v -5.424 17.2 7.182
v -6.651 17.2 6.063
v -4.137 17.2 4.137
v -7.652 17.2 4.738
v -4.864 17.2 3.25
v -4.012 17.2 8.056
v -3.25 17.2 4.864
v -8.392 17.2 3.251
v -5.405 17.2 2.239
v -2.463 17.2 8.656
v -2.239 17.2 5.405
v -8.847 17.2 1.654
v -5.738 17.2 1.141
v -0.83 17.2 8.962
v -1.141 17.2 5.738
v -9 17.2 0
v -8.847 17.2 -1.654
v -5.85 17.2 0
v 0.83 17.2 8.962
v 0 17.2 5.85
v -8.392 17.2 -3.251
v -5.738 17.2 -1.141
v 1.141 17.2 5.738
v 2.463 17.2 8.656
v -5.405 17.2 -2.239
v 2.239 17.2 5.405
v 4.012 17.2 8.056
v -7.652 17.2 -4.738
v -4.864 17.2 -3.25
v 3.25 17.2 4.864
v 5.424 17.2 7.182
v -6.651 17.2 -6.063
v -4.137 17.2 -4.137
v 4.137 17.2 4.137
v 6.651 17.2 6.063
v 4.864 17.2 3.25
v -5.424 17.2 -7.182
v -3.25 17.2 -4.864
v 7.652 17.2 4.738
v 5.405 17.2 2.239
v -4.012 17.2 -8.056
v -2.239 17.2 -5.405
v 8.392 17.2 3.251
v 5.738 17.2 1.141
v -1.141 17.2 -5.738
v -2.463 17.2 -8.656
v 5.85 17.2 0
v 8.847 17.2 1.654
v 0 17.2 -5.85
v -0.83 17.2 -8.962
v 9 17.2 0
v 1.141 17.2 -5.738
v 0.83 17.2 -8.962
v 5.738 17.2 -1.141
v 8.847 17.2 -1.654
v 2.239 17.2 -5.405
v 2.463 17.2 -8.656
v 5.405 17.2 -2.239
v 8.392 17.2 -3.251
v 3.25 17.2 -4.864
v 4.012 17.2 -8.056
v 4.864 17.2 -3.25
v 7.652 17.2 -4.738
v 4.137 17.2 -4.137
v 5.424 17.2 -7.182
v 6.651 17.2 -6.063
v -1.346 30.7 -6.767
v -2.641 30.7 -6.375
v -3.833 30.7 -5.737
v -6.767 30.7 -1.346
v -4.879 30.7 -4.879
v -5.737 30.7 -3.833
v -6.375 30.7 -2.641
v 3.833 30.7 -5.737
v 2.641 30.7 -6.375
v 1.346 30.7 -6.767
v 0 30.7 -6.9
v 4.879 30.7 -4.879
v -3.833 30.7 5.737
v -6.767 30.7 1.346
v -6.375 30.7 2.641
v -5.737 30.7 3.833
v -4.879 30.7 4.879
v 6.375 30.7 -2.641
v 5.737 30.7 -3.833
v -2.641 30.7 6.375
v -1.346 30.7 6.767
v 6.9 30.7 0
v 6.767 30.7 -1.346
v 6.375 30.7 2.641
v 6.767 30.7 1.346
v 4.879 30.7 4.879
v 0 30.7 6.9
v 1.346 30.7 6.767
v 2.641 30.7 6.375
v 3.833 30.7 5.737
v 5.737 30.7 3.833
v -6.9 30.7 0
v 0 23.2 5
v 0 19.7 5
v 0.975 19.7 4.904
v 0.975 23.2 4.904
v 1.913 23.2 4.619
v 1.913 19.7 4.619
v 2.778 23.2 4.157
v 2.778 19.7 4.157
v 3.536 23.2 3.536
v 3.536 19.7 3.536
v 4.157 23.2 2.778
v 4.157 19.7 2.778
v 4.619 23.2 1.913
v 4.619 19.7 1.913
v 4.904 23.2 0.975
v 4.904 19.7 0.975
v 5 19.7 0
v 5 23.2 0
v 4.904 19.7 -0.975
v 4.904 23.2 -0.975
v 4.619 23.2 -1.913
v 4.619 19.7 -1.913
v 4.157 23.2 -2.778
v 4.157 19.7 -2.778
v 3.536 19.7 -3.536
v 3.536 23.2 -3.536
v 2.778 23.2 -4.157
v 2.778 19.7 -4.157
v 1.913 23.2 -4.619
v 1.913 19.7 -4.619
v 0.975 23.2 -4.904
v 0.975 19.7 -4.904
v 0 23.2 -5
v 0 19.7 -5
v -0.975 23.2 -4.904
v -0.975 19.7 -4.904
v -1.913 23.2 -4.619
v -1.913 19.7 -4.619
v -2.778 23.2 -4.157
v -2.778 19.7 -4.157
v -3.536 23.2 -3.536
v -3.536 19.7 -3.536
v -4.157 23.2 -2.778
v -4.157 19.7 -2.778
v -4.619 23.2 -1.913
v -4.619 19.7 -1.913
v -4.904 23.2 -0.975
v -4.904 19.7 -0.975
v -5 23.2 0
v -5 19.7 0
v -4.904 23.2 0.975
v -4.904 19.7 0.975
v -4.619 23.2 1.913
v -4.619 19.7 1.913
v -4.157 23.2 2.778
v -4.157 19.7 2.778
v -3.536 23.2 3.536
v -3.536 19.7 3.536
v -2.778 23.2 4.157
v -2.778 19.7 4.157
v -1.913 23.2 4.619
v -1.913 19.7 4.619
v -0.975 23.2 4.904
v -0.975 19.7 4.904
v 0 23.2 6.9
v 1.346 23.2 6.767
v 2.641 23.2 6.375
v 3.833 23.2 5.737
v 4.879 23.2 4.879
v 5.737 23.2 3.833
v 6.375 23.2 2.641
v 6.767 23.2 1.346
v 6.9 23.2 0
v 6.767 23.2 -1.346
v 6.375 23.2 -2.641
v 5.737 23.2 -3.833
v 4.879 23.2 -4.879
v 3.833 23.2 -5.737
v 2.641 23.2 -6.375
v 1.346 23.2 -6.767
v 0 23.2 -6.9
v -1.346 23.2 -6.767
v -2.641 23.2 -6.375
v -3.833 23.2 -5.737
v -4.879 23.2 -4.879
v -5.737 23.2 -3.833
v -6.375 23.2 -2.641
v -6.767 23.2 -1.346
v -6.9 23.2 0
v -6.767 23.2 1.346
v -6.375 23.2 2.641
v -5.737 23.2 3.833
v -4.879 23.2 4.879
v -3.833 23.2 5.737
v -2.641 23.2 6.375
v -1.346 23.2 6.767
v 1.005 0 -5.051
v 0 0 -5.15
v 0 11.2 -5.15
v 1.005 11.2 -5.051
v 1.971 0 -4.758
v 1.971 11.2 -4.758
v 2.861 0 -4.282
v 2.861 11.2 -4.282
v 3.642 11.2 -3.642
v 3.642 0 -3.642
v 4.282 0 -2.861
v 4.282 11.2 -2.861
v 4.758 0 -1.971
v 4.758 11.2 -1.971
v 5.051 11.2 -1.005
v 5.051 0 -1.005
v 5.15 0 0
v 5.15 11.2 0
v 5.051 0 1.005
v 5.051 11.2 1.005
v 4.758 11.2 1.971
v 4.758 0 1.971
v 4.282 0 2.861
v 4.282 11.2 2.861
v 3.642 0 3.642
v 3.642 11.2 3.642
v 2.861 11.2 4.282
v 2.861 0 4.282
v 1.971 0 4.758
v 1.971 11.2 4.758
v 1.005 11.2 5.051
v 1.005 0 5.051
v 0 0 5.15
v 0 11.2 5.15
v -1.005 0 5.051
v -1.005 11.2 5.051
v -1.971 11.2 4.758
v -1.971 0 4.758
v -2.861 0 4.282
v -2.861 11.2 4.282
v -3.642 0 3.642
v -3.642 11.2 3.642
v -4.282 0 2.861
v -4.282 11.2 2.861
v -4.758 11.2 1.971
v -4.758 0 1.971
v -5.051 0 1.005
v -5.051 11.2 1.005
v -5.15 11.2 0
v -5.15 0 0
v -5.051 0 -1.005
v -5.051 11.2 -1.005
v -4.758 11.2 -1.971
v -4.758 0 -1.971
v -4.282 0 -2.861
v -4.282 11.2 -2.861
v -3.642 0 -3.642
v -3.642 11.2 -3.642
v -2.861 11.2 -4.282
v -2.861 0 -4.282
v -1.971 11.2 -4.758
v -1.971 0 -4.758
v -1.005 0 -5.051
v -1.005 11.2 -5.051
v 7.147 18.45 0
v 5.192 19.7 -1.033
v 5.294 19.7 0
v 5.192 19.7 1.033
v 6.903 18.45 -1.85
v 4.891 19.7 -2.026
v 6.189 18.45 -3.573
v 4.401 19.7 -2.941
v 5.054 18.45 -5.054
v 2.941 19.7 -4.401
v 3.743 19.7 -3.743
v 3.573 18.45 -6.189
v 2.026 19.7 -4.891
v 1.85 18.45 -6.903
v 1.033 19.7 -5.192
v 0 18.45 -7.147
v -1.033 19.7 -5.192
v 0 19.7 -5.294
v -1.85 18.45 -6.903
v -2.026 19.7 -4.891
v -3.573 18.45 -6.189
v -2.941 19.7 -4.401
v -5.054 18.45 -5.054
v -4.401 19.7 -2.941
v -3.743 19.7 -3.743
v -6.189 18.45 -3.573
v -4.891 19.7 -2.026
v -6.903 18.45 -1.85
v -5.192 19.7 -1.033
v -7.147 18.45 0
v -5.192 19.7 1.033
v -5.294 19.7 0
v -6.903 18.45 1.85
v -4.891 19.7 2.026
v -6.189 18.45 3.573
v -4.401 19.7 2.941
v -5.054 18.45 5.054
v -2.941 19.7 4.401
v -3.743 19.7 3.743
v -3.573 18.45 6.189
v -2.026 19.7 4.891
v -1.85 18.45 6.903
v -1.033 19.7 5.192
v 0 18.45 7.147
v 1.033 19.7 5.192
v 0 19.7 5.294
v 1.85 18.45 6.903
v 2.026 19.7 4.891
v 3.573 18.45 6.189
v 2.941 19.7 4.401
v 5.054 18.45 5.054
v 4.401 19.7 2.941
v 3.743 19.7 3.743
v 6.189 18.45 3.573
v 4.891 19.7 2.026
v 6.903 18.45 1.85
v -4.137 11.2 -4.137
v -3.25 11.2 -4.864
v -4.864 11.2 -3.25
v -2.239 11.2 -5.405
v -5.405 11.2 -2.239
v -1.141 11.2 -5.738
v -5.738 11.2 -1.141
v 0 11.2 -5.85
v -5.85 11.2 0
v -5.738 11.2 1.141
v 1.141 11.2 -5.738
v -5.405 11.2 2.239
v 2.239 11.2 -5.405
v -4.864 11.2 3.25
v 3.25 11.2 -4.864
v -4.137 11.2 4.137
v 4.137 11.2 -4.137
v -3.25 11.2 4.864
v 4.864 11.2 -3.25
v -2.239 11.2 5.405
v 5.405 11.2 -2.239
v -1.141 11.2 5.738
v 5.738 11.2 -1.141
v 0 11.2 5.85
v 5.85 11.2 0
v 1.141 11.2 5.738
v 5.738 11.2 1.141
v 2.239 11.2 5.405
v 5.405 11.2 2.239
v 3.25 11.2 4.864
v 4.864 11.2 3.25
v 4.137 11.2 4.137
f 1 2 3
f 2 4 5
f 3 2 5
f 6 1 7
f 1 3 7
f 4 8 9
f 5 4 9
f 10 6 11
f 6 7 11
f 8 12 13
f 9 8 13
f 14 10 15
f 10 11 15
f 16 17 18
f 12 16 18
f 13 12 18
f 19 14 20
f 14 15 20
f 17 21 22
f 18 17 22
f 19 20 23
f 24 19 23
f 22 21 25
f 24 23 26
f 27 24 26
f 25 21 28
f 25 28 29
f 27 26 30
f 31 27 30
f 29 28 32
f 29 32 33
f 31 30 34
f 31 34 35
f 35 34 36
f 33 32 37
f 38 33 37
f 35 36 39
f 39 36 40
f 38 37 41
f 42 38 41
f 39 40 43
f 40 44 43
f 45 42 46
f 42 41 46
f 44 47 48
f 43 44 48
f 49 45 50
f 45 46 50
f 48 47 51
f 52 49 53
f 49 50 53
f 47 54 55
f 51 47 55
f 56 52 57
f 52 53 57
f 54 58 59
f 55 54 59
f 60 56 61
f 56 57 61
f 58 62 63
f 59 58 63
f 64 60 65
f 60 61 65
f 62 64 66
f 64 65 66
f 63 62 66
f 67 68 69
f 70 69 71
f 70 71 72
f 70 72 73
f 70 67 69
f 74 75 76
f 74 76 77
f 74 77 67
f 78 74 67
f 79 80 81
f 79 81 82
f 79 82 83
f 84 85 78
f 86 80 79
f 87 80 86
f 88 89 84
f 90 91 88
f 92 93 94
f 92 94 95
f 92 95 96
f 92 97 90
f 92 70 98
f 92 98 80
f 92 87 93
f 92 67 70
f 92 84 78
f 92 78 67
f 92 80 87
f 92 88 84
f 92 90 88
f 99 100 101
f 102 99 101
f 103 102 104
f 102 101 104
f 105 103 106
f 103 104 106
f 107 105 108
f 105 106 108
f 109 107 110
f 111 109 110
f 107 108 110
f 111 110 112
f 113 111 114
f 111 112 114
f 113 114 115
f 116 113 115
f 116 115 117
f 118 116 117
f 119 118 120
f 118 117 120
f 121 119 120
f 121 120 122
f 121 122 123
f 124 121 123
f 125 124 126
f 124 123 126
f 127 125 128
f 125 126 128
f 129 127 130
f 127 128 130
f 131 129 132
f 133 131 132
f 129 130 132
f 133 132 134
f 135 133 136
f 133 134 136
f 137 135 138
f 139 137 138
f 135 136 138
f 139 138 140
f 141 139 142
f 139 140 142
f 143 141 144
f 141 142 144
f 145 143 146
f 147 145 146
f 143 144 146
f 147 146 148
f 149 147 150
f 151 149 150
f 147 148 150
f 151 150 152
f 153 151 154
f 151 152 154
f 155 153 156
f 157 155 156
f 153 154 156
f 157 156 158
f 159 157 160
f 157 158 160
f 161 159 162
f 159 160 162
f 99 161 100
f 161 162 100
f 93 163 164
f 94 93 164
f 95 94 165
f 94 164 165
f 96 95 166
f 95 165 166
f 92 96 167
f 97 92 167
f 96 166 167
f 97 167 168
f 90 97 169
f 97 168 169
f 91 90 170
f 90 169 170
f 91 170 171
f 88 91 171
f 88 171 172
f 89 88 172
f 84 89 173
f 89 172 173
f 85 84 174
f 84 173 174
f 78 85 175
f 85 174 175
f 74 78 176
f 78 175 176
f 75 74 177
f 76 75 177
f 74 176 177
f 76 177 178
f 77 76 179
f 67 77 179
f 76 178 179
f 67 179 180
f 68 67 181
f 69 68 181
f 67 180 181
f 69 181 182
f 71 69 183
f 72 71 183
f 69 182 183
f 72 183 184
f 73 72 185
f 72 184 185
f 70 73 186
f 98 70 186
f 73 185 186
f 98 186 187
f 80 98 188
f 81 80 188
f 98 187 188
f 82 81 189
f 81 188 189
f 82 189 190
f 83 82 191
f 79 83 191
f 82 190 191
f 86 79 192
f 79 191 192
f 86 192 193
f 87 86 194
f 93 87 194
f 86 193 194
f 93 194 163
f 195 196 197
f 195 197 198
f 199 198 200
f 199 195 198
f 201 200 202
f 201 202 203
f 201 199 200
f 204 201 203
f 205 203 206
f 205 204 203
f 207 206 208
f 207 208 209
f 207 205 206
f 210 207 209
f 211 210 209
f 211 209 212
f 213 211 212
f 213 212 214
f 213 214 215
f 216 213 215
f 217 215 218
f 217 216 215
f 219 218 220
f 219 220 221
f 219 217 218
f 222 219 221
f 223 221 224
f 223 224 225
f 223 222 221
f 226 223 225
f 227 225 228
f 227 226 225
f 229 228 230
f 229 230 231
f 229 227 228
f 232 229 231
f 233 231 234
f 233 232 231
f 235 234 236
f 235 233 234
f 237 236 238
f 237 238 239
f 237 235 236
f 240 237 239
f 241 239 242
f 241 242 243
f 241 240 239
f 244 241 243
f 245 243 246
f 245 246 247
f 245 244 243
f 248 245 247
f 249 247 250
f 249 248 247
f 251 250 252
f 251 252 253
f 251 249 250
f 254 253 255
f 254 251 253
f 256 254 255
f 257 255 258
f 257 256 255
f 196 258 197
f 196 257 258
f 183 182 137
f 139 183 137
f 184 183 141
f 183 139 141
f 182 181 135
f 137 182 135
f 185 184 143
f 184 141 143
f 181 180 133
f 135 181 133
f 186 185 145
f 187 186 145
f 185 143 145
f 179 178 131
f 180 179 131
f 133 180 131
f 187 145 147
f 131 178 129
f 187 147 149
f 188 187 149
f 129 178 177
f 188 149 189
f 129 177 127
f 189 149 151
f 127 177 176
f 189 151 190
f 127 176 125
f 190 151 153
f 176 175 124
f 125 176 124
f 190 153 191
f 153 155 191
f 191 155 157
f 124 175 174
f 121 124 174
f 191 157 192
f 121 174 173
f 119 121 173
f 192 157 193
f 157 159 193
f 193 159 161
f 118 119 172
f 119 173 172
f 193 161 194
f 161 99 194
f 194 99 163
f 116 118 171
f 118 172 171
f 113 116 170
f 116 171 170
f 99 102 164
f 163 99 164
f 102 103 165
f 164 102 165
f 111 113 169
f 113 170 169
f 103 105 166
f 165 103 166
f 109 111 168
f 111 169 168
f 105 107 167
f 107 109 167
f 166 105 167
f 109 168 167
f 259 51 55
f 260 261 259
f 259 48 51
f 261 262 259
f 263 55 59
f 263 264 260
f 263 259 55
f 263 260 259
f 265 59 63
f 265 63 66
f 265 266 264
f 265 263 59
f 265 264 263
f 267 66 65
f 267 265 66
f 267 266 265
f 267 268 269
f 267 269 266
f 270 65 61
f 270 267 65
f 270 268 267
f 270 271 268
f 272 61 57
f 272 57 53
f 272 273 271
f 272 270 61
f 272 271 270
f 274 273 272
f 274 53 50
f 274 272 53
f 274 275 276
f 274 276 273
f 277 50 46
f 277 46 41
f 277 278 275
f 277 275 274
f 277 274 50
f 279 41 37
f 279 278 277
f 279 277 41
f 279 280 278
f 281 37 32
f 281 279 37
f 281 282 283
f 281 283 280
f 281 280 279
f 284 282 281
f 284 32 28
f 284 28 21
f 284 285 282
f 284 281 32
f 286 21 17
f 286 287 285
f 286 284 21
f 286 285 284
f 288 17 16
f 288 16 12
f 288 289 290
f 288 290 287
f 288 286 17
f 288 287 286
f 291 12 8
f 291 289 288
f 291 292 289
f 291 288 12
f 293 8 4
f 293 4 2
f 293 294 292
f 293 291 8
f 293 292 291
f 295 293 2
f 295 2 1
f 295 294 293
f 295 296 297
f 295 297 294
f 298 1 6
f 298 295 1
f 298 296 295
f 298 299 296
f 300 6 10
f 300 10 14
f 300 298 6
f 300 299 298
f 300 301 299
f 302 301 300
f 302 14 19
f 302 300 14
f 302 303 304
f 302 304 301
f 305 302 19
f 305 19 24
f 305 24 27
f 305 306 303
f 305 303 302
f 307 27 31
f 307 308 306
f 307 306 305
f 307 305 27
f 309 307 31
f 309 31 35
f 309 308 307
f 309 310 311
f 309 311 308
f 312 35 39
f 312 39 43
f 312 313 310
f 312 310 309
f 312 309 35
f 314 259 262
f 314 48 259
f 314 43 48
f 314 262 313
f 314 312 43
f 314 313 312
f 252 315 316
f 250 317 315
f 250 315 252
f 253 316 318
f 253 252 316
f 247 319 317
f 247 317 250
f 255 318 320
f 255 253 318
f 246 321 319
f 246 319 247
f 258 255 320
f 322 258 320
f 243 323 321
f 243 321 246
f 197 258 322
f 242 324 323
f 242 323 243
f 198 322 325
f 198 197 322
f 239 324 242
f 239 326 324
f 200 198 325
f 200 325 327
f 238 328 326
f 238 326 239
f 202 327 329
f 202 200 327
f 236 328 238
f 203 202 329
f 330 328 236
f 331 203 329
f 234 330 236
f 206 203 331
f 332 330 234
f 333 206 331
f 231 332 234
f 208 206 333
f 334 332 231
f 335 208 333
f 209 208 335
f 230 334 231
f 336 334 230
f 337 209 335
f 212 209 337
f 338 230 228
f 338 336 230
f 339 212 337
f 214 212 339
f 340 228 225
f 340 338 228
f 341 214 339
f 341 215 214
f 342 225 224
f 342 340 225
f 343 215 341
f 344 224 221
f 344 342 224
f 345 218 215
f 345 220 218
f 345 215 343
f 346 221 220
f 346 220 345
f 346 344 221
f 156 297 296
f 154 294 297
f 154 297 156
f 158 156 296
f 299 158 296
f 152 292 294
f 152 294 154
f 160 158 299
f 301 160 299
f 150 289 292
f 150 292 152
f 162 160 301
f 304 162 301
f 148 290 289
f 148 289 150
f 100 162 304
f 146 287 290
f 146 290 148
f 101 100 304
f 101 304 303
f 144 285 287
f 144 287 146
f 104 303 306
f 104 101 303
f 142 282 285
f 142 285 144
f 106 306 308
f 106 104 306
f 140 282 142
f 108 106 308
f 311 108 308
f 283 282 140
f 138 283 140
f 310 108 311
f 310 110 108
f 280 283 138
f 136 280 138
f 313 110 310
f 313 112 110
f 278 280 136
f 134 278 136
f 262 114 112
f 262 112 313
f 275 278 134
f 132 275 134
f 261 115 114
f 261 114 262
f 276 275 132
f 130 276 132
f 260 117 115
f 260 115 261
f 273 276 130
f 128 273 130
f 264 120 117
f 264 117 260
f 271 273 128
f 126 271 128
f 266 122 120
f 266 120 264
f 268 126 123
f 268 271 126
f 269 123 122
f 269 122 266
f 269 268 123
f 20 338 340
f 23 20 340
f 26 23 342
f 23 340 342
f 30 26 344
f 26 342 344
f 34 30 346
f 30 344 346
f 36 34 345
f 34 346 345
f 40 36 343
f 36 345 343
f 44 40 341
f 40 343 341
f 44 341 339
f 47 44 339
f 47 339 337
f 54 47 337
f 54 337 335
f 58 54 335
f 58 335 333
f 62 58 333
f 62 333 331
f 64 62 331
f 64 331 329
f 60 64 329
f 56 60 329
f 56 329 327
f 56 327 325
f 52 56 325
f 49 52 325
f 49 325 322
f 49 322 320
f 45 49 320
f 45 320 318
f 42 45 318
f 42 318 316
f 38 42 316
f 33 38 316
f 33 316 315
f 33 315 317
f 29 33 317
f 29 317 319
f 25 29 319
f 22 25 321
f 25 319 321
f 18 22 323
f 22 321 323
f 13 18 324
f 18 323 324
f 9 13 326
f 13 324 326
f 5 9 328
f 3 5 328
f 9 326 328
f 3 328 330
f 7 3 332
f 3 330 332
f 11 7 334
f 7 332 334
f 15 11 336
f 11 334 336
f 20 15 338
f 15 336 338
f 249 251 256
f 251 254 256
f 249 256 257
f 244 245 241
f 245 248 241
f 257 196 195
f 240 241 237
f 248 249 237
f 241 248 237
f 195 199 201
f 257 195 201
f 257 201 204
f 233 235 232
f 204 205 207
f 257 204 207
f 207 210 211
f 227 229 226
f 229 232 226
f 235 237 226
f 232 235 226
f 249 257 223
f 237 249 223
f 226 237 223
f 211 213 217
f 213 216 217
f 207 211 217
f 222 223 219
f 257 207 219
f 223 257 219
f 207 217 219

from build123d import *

# Parameters (mm, degrees)
SKETCH1_R           = 5.85
BOSS_EXTRUDE1_DEPTH = 17.2
SKETCH2_R           = 9
BOSS_EXTRUDE2_DEPTH = 2.5
BOSS_EXTRUDE2_TAPER = 56
SKETCH3_R           = 5
BOSS_EXTRUDE3_DEPTH = 3.5
SKETCH4_R           = 6.9
BOSS_EXTRUDE4_DEPTH = 7.5
SKETCH5_OUTSIDE_W   = 27.976
SKETCH5_OUTSIDE_H   = 27.976
SKETCH5_OUTSIDE_R   = 5.15
CUT_EXTRUDE1_DEPTH  = 11.2


with BuildPart() as part:
    # Sketch1 → Boss-Extrude1 (new body)
    with BuildSketch(Plane(origin=(0, 0, 0), x_dir=(1, 0, 0), z_dir=(0, 1, 0))):
        with Locations(Location((0, 0, 0), (0, 0, 270))):  # turned: the seam where the file's is
            Circle(SKETCH1_R)
    extrude(amount=BOSS_EXTRUDE1_DEPTH)

    # Sketch2 → Boss-Extrude2 (add)
    with BuildSketch(Plane(origin=(0, 17.2, 0), x_dir=(1, 0, 0), z_dir=(0, 1, 0))):
        Circle(SKETCH2_R)
    extrude(amount=BOSS_EXTRUDE2_DEPTH, taper=BOSS_EXTRUDE2_TAPER)

    # Sketch3 → Boss-Extrude3 (add)
    with BuildSketch(Plane(origin=(0, 19.7, 0), x_dir=(1, 0, 0), z_dir=(0, 1, 0))):
        with Locations(Location((0, 0, 0), (0, 0, 270))):  # turned: the seam where the file's is
            Circle(SKETCH3_R)
    extrude(amount=BOSS_EXTRUDE3_DEPTH)

    # Sketch4 → Boss-Extrude4 (add)
    with BuildSketch(Plane(origin=(0, 23.2, 0), x_dir=(1, 0, 0), z_dir=(0, 1, 0))):
        with Locations(Location((0, 0, 0), (0, 0, 270))):  # turned: the seam where the file's is
            Circle(SKETCH4_R)
    extrude(amount=BOSS_EXTRUDE4_DEPTH)

    # Sketch5 outside → Cut-Extrude1 (cut)
    with BuildSketch(Plane.XZ):
        Rectangle(SKETCH5_OUTSIDE_W, SKETCH5_OUTSIDE_H)
        with Locations(Location((0, 0, 0), (0, 0, 270))):  # turned: the seam where the file's is
            Circle(SKETCH5_OUTSIDE_R, mode=Mode.SUBTRACT)
    extrude(amount=-CUT_EXTRUDE1_DEPTH, mode=Mode.SUBTRACT)


solid = part.part
